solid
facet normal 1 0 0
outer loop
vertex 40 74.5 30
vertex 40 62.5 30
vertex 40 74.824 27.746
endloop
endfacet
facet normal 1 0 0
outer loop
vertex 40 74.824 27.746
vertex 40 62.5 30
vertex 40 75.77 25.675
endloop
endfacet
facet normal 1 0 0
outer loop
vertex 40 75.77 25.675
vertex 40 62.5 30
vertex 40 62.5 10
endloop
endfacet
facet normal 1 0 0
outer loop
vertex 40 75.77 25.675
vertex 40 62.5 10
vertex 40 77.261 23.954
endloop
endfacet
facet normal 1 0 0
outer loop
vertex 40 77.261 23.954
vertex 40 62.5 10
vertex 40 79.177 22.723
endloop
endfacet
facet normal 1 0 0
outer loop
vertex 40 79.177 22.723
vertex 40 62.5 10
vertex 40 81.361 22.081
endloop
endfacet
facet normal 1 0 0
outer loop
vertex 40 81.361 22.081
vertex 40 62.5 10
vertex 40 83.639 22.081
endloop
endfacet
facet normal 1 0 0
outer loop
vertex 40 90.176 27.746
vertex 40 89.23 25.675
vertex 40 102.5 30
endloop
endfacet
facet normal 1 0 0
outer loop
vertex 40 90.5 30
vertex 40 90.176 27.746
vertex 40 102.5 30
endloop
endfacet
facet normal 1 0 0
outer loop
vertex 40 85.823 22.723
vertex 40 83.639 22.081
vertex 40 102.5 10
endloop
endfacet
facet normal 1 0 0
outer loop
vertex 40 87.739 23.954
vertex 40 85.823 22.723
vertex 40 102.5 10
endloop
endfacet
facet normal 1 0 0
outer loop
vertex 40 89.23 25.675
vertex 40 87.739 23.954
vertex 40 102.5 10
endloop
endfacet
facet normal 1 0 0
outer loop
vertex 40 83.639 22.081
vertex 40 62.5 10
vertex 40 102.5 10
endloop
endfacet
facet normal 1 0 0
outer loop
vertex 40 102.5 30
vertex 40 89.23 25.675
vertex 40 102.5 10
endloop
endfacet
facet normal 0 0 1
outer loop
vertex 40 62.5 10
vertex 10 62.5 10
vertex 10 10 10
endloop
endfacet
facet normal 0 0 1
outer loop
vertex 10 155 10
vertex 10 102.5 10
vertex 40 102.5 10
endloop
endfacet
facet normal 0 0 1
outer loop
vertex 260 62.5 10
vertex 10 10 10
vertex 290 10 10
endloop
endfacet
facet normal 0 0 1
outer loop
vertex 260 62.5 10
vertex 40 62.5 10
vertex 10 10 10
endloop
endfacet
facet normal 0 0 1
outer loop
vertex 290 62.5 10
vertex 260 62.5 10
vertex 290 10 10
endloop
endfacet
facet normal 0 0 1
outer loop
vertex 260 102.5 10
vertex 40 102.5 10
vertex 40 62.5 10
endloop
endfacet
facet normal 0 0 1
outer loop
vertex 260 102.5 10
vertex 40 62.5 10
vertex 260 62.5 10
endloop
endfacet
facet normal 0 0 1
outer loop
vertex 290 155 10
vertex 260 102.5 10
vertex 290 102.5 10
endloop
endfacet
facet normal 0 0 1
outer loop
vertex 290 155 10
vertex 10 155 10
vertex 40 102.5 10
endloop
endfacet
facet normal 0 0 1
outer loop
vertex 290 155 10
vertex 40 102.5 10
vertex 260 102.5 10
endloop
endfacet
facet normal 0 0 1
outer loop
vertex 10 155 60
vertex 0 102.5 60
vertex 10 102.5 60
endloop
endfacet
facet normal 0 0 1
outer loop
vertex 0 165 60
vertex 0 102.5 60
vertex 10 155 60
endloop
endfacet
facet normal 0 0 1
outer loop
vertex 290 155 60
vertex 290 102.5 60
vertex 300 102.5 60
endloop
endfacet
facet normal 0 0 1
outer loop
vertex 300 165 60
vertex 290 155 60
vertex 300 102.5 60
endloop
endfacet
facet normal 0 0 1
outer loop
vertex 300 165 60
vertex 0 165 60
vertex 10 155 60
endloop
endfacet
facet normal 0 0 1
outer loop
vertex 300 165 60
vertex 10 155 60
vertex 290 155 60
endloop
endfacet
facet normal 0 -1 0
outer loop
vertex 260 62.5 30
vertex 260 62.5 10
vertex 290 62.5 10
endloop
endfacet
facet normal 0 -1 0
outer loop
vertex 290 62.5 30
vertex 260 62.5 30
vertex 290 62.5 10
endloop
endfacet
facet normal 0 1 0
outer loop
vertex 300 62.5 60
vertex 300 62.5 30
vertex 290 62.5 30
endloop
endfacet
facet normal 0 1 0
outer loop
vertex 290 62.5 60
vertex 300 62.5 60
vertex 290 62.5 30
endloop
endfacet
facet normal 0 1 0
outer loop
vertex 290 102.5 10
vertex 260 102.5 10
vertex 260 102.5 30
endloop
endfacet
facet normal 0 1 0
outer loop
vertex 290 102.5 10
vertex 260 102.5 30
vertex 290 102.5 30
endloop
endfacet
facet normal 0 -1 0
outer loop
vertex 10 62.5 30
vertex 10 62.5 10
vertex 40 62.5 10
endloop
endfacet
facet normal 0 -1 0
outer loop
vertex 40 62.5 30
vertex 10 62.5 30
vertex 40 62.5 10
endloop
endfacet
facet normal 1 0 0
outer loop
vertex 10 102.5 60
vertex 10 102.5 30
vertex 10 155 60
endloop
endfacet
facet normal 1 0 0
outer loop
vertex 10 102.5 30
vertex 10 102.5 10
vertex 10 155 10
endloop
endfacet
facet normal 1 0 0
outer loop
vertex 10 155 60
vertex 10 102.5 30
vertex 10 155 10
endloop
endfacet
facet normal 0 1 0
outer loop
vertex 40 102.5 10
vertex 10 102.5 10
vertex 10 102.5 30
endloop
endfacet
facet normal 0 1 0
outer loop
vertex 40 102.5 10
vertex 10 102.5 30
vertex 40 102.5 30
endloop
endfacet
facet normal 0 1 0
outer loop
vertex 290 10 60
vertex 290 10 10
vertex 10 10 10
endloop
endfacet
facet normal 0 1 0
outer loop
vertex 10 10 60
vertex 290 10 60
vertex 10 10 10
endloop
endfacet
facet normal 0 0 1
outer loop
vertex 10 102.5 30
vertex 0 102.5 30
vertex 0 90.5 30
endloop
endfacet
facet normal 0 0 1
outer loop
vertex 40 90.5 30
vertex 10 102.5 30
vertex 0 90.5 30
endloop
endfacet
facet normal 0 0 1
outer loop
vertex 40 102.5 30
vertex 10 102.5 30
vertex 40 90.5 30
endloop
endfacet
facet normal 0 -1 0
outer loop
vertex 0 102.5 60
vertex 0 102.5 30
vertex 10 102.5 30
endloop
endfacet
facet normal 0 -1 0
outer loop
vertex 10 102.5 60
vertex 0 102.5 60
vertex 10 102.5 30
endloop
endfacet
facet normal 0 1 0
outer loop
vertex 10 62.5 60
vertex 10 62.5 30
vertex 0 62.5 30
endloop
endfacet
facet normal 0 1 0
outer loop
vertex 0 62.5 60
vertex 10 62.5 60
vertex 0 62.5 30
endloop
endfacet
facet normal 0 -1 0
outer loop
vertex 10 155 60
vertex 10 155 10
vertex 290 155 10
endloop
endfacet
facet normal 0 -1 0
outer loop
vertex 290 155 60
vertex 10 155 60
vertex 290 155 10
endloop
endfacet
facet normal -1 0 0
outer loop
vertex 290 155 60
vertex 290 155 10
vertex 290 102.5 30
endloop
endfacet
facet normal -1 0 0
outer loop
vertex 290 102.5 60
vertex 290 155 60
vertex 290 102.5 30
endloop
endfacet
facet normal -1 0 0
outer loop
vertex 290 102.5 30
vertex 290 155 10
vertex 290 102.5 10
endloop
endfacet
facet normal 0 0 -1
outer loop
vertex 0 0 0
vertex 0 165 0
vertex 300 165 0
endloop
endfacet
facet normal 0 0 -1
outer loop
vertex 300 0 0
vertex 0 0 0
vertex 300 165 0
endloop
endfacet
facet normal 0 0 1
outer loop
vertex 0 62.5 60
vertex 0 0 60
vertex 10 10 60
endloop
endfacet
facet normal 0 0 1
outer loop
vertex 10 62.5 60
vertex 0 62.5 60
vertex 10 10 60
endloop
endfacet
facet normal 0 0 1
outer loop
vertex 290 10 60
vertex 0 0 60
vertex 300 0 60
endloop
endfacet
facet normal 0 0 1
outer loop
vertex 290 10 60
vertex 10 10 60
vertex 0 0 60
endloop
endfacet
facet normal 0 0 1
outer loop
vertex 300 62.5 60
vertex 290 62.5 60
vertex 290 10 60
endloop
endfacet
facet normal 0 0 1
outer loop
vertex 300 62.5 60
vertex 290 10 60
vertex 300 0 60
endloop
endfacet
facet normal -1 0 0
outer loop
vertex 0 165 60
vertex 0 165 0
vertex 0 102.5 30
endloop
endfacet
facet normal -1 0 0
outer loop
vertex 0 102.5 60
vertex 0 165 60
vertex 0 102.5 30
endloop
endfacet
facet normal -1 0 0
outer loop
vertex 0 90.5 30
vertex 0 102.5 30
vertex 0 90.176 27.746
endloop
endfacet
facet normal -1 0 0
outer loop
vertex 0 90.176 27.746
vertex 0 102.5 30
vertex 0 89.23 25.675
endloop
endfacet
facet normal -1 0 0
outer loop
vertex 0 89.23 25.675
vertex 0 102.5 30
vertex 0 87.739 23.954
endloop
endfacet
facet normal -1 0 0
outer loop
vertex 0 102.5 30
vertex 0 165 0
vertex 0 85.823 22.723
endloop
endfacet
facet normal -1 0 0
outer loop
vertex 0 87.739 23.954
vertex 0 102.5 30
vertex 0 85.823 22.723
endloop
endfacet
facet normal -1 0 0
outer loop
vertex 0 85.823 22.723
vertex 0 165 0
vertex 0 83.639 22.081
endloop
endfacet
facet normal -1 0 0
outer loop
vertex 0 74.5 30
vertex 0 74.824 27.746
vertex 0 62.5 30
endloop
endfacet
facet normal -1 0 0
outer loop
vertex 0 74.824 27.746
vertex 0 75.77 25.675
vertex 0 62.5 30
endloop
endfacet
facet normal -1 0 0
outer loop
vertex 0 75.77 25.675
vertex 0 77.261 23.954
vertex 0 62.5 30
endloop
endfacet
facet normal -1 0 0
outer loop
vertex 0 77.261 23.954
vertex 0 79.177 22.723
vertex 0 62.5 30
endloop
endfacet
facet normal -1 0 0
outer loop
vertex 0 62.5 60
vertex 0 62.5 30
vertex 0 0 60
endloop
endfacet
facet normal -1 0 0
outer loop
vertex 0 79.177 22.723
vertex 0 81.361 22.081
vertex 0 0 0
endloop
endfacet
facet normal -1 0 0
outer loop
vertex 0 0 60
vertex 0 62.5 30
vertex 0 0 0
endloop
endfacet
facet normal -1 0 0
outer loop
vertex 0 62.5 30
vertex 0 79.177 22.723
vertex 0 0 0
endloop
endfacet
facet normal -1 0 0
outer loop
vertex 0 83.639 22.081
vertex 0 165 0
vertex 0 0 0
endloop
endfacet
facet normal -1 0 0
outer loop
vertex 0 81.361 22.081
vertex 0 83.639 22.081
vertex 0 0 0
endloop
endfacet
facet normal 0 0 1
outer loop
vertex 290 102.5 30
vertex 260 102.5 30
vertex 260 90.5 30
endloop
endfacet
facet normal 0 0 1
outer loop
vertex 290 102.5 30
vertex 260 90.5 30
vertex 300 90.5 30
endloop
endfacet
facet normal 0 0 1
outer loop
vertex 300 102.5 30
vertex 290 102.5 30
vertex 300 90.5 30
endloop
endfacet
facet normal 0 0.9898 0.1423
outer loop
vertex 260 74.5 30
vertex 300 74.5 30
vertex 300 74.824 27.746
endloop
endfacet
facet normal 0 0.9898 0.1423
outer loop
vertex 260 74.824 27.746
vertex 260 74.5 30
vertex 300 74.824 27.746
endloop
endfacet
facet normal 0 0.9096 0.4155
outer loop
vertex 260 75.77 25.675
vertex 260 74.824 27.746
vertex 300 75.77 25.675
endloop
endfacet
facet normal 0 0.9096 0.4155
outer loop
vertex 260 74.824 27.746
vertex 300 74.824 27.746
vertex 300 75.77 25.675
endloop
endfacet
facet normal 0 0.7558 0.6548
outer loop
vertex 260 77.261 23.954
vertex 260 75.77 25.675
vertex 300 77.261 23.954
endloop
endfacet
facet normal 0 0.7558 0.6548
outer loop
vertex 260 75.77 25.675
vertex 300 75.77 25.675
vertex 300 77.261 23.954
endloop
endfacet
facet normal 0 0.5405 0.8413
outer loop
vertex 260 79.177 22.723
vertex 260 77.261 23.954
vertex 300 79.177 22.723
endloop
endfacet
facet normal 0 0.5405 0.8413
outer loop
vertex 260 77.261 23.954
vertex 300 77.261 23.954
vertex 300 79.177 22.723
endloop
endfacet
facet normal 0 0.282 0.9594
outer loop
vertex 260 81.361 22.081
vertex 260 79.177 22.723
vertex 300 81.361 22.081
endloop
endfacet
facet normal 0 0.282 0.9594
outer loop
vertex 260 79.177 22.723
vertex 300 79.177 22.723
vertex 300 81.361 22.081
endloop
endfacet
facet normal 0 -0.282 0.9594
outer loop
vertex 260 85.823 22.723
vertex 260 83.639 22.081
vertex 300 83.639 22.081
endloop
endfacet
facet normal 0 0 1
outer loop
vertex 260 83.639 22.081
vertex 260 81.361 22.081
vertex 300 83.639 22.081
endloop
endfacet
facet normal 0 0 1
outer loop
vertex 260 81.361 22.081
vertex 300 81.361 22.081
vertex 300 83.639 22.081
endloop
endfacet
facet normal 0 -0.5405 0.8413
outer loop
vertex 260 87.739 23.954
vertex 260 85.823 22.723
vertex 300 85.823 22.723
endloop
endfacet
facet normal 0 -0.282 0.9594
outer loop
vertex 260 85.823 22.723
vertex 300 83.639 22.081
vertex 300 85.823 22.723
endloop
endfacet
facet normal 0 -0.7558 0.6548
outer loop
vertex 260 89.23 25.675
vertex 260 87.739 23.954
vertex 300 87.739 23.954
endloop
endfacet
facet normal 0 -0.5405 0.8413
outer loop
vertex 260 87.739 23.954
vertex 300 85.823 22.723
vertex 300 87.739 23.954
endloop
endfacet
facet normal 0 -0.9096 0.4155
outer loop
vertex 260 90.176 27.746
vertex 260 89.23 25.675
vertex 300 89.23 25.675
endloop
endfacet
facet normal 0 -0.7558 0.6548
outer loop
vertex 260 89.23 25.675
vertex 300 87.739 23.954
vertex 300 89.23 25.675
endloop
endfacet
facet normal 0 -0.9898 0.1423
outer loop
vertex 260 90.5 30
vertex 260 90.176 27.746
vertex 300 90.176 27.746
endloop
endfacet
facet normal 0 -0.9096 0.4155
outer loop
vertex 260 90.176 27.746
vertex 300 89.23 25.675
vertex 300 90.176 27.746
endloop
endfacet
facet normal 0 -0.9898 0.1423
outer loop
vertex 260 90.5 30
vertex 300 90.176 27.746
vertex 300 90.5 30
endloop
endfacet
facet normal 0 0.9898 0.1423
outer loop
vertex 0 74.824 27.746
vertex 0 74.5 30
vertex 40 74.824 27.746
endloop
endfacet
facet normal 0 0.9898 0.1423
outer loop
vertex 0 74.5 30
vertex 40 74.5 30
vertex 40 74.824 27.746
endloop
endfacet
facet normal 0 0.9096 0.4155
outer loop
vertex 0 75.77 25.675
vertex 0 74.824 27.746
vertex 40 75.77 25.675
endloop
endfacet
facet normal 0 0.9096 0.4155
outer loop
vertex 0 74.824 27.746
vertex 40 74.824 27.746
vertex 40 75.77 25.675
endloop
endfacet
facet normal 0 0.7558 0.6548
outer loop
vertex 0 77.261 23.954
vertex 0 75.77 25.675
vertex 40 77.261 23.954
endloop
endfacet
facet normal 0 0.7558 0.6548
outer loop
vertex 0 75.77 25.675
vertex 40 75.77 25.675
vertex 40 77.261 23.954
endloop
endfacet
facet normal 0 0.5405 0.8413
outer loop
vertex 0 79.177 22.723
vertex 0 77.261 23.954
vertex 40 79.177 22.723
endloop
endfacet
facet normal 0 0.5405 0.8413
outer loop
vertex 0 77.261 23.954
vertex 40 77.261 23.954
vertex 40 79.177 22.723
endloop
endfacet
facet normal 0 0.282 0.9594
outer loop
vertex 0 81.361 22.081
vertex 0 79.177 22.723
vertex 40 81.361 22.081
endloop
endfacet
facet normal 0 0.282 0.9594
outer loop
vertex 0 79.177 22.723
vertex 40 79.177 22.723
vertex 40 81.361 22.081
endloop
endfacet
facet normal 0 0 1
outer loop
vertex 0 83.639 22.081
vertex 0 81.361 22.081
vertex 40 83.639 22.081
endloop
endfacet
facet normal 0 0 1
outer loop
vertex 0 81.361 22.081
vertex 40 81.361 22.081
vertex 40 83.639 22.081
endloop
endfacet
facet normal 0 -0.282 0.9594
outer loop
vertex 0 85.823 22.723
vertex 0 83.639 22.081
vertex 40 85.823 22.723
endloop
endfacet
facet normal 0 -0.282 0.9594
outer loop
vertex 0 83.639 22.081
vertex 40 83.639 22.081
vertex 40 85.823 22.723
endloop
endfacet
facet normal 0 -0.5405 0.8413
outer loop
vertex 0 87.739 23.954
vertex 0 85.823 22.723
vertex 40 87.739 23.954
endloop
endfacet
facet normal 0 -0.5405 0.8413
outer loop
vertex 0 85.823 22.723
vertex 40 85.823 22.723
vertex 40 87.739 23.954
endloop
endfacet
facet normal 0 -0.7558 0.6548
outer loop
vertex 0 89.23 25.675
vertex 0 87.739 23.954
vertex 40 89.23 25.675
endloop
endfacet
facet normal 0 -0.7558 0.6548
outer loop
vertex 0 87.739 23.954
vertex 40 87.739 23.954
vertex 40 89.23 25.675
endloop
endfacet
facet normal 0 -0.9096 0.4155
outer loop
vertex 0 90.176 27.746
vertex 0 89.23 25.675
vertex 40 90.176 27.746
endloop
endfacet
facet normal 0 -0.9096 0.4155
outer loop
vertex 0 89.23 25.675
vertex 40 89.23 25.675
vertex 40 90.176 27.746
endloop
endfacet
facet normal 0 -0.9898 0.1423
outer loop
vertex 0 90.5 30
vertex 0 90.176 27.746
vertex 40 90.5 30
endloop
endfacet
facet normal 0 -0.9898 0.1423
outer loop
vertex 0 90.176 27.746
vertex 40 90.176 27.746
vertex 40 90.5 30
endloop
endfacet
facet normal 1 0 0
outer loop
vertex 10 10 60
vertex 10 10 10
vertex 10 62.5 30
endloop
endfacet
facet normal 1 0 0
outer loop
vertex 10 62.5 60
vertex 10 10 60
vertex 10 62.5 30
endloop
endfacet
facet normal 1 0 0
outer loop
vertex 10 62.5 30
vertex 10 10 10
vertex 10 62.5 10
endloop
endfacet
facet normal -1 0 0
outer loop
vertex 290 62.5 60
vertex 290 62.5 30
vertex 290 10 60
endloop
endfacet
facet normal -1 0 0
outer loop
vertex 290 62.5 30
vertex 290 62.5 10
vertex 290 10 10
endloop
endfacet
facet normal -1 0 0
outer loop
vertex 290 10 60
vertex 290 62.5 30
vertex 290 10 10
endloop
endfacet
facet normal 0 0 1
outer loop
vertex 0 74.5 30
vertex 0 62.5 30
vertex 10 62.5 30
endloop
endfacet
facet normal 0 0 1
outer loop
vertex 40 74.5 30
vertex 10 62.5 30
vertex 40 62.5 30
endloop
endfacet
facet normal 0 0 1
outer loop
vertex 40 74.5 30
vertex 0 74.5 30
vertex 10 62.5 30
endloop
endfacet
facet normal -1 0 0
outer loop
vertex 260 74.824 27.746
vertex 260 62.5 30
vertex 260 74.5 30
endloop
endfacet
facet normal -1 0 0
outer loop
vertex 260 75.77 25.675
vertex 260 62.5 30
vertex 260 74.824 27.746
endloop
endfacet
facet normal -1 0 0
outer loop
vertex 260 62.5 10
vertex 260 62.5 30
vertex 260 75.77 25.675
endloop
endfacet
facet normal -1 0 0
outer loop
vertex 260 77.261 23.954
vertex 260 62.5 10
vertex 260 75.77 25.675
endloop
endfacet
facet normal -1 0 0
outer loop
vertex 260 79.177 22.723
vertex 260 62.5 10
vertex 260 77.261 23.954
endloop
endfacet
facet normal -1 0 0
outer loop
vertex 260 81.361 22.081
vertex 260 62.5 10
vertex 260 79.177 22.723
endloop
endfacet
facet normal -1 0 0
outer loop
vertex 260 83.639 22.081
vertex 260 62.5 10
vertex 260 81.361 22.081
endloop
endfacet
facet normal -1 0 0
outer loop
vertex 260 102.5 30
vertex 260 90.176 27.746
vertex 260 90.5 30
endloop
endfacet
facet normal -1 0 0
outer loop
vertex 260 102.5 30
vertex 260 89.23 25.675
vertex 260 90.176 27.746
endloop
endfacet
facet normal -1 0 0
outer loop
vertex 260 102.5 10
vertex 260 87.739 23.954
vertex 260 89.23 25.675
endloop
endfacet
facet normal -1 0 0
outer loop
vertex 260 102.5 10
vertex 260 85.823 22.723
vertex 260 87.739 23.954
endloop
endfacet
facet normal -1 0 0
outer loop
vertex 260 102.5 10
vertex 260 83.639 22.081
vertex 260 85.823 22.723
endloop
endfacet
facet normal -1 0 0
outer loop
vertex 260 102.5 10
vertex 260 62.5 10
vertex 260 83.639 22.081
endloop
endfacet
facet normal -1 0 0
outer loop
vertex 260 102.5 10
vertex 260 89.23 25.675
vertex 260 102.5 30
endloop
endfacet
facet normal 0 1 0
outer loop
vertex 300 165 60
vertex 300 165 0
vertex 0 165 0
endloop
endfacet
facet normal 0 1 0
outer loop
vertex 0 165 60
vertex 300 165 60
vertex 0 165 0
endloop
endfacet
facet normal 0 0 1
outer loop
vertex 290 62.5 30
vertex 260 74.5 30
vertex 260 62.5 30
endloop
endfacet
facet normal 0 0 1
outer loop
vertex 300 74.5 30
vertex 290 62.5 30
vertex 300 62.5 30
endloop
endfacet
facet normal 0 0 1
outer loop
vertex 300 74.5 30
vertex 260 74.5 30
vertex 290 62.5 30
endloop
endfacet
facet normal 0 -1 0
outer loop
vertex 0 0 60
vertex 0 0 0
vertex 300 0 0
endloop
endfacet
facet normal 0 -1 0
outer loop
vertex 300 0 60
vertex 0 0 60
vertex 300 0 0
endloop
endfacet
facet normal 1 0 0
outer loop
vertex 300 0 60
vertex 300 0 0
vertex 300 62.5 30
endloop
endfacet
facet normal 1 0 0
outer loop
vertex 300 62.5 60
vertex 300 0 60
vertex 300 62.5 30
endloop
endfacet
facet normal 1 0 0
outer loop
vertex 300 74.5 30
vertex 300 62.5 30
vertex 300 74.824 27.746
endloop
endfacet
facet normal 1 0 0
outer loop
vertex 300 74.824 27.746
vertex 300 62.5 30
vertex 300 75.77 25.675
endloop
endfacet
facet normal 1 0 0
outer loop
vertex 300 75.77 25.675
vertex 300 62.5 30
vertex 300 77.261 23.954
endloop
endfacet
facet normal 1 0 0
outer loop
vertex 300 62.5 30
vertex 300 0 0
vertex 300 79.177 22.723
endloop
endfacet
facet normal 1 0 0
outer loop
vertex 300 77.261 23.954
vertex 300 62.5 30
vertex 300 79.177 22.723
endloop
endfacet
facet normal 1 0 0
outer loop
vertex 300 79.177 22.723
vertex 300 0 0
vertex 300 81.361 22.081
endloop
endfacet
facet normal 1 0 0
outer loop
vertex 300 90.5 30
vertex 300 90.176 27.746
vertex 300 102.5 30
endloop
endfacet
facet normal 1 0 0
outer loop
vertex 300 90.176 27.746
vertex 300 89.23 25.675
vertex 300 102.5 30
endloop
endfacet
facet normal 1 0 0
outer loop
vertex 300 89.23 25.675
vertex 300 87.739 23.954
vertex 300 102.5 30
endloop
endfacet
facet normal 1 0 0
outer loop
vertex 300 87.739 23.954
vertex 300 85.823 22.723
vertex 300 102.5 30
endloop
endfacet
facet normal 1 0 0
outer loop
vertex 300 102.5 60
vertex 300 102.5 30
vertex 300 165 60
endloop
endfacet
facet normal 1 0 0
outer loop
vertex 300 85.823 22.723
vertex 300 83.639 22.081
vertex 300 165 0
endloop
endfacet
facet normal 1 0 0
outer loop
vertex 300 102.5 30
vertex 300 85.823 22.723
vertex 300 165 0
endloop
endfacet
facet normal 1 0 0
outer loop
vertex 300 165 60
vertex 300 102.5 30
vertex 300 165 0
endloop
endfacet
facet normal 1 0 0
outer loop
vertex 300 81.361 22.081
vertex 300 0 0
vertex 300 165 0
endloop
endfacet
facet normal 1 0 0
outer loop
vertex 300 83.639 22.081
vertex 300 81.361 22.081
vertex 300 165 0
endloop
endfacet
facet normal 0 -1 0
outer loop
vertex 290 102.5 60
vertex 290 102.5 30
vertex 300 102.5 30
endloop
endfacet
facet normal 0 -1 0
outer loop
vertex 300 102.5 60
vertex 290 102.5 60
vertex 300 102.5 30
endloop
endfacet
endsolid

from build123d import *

# Parameters (mm, degrees)
SKETCH_1_W          = 300
SKETCH_1_H          = 165
EXTRUDE_1_DEPTH     = 10
SKETCH_2_W          = 40
SKETCH_2_H          = 40
EXTRUDE_2_DEPTH     = 20
EXTRUDE_3_DEPTH     = 50
SKETCH_5_R          = 8
CUT_EXTRUDE_1_DEPTH = 348.598906788


with BuildPart() as part:
    # 스케치1 → 보스-돌출1 (new body)
    with BuildSketch(Plane.XY):
        with Locations((150, 82.5)):
            Rectangle(SKETCH_1_W, SKETCH_1_H)
    extrude(amount=EXTRUDE_1_DEPTH)

    # 스케치2 → 보스-돌출2 (add)
    with BuildSketch(Plane.XY.offset(10)):
        with Locations((20, 82.5)):
            Rectangle(SKETCH_2_W, SKETCH_2_H)
        with Locations((280, 82.5)):
            Rectangle(SKETCH_2_W, SKETCH_2_H)
    extrude(amount=EXTRUDE_2_DEPTH)

    # 스케치4 → 보스-돌출3 (add)
    with BuildSketch(Plane.XY.offset(10)):
        Polygon((0, 165), (0, 102.5), (10, 102.5), (10, 155), (290, 155), (290, 102.5), (300, 102.5), (300, 165), align=None)
        Polygon((10, 62.5), (0, 62.5), (0, 0), (300, 0), (300, 62.5), (290, 62.5), (290, 10), (10, 10), align=None)
    extrude(amount=EXTRUDE_3_DEPTH)

    # 스케치5 → 컷-돌출1 (cut, through all)
    with BuildSketch(Plane(origin=(300, 0, 0), x_dir=(0, 0, -1), z_dir=(1, 0, 0))):
        with Locations((-30, 82.5)):
            Circle(SKETCH_5_R)
    extrude(amount=-CUT_EXTRUDE_1_DEPTH, mode=Mode.SUBTRACT)


solid = part.part
